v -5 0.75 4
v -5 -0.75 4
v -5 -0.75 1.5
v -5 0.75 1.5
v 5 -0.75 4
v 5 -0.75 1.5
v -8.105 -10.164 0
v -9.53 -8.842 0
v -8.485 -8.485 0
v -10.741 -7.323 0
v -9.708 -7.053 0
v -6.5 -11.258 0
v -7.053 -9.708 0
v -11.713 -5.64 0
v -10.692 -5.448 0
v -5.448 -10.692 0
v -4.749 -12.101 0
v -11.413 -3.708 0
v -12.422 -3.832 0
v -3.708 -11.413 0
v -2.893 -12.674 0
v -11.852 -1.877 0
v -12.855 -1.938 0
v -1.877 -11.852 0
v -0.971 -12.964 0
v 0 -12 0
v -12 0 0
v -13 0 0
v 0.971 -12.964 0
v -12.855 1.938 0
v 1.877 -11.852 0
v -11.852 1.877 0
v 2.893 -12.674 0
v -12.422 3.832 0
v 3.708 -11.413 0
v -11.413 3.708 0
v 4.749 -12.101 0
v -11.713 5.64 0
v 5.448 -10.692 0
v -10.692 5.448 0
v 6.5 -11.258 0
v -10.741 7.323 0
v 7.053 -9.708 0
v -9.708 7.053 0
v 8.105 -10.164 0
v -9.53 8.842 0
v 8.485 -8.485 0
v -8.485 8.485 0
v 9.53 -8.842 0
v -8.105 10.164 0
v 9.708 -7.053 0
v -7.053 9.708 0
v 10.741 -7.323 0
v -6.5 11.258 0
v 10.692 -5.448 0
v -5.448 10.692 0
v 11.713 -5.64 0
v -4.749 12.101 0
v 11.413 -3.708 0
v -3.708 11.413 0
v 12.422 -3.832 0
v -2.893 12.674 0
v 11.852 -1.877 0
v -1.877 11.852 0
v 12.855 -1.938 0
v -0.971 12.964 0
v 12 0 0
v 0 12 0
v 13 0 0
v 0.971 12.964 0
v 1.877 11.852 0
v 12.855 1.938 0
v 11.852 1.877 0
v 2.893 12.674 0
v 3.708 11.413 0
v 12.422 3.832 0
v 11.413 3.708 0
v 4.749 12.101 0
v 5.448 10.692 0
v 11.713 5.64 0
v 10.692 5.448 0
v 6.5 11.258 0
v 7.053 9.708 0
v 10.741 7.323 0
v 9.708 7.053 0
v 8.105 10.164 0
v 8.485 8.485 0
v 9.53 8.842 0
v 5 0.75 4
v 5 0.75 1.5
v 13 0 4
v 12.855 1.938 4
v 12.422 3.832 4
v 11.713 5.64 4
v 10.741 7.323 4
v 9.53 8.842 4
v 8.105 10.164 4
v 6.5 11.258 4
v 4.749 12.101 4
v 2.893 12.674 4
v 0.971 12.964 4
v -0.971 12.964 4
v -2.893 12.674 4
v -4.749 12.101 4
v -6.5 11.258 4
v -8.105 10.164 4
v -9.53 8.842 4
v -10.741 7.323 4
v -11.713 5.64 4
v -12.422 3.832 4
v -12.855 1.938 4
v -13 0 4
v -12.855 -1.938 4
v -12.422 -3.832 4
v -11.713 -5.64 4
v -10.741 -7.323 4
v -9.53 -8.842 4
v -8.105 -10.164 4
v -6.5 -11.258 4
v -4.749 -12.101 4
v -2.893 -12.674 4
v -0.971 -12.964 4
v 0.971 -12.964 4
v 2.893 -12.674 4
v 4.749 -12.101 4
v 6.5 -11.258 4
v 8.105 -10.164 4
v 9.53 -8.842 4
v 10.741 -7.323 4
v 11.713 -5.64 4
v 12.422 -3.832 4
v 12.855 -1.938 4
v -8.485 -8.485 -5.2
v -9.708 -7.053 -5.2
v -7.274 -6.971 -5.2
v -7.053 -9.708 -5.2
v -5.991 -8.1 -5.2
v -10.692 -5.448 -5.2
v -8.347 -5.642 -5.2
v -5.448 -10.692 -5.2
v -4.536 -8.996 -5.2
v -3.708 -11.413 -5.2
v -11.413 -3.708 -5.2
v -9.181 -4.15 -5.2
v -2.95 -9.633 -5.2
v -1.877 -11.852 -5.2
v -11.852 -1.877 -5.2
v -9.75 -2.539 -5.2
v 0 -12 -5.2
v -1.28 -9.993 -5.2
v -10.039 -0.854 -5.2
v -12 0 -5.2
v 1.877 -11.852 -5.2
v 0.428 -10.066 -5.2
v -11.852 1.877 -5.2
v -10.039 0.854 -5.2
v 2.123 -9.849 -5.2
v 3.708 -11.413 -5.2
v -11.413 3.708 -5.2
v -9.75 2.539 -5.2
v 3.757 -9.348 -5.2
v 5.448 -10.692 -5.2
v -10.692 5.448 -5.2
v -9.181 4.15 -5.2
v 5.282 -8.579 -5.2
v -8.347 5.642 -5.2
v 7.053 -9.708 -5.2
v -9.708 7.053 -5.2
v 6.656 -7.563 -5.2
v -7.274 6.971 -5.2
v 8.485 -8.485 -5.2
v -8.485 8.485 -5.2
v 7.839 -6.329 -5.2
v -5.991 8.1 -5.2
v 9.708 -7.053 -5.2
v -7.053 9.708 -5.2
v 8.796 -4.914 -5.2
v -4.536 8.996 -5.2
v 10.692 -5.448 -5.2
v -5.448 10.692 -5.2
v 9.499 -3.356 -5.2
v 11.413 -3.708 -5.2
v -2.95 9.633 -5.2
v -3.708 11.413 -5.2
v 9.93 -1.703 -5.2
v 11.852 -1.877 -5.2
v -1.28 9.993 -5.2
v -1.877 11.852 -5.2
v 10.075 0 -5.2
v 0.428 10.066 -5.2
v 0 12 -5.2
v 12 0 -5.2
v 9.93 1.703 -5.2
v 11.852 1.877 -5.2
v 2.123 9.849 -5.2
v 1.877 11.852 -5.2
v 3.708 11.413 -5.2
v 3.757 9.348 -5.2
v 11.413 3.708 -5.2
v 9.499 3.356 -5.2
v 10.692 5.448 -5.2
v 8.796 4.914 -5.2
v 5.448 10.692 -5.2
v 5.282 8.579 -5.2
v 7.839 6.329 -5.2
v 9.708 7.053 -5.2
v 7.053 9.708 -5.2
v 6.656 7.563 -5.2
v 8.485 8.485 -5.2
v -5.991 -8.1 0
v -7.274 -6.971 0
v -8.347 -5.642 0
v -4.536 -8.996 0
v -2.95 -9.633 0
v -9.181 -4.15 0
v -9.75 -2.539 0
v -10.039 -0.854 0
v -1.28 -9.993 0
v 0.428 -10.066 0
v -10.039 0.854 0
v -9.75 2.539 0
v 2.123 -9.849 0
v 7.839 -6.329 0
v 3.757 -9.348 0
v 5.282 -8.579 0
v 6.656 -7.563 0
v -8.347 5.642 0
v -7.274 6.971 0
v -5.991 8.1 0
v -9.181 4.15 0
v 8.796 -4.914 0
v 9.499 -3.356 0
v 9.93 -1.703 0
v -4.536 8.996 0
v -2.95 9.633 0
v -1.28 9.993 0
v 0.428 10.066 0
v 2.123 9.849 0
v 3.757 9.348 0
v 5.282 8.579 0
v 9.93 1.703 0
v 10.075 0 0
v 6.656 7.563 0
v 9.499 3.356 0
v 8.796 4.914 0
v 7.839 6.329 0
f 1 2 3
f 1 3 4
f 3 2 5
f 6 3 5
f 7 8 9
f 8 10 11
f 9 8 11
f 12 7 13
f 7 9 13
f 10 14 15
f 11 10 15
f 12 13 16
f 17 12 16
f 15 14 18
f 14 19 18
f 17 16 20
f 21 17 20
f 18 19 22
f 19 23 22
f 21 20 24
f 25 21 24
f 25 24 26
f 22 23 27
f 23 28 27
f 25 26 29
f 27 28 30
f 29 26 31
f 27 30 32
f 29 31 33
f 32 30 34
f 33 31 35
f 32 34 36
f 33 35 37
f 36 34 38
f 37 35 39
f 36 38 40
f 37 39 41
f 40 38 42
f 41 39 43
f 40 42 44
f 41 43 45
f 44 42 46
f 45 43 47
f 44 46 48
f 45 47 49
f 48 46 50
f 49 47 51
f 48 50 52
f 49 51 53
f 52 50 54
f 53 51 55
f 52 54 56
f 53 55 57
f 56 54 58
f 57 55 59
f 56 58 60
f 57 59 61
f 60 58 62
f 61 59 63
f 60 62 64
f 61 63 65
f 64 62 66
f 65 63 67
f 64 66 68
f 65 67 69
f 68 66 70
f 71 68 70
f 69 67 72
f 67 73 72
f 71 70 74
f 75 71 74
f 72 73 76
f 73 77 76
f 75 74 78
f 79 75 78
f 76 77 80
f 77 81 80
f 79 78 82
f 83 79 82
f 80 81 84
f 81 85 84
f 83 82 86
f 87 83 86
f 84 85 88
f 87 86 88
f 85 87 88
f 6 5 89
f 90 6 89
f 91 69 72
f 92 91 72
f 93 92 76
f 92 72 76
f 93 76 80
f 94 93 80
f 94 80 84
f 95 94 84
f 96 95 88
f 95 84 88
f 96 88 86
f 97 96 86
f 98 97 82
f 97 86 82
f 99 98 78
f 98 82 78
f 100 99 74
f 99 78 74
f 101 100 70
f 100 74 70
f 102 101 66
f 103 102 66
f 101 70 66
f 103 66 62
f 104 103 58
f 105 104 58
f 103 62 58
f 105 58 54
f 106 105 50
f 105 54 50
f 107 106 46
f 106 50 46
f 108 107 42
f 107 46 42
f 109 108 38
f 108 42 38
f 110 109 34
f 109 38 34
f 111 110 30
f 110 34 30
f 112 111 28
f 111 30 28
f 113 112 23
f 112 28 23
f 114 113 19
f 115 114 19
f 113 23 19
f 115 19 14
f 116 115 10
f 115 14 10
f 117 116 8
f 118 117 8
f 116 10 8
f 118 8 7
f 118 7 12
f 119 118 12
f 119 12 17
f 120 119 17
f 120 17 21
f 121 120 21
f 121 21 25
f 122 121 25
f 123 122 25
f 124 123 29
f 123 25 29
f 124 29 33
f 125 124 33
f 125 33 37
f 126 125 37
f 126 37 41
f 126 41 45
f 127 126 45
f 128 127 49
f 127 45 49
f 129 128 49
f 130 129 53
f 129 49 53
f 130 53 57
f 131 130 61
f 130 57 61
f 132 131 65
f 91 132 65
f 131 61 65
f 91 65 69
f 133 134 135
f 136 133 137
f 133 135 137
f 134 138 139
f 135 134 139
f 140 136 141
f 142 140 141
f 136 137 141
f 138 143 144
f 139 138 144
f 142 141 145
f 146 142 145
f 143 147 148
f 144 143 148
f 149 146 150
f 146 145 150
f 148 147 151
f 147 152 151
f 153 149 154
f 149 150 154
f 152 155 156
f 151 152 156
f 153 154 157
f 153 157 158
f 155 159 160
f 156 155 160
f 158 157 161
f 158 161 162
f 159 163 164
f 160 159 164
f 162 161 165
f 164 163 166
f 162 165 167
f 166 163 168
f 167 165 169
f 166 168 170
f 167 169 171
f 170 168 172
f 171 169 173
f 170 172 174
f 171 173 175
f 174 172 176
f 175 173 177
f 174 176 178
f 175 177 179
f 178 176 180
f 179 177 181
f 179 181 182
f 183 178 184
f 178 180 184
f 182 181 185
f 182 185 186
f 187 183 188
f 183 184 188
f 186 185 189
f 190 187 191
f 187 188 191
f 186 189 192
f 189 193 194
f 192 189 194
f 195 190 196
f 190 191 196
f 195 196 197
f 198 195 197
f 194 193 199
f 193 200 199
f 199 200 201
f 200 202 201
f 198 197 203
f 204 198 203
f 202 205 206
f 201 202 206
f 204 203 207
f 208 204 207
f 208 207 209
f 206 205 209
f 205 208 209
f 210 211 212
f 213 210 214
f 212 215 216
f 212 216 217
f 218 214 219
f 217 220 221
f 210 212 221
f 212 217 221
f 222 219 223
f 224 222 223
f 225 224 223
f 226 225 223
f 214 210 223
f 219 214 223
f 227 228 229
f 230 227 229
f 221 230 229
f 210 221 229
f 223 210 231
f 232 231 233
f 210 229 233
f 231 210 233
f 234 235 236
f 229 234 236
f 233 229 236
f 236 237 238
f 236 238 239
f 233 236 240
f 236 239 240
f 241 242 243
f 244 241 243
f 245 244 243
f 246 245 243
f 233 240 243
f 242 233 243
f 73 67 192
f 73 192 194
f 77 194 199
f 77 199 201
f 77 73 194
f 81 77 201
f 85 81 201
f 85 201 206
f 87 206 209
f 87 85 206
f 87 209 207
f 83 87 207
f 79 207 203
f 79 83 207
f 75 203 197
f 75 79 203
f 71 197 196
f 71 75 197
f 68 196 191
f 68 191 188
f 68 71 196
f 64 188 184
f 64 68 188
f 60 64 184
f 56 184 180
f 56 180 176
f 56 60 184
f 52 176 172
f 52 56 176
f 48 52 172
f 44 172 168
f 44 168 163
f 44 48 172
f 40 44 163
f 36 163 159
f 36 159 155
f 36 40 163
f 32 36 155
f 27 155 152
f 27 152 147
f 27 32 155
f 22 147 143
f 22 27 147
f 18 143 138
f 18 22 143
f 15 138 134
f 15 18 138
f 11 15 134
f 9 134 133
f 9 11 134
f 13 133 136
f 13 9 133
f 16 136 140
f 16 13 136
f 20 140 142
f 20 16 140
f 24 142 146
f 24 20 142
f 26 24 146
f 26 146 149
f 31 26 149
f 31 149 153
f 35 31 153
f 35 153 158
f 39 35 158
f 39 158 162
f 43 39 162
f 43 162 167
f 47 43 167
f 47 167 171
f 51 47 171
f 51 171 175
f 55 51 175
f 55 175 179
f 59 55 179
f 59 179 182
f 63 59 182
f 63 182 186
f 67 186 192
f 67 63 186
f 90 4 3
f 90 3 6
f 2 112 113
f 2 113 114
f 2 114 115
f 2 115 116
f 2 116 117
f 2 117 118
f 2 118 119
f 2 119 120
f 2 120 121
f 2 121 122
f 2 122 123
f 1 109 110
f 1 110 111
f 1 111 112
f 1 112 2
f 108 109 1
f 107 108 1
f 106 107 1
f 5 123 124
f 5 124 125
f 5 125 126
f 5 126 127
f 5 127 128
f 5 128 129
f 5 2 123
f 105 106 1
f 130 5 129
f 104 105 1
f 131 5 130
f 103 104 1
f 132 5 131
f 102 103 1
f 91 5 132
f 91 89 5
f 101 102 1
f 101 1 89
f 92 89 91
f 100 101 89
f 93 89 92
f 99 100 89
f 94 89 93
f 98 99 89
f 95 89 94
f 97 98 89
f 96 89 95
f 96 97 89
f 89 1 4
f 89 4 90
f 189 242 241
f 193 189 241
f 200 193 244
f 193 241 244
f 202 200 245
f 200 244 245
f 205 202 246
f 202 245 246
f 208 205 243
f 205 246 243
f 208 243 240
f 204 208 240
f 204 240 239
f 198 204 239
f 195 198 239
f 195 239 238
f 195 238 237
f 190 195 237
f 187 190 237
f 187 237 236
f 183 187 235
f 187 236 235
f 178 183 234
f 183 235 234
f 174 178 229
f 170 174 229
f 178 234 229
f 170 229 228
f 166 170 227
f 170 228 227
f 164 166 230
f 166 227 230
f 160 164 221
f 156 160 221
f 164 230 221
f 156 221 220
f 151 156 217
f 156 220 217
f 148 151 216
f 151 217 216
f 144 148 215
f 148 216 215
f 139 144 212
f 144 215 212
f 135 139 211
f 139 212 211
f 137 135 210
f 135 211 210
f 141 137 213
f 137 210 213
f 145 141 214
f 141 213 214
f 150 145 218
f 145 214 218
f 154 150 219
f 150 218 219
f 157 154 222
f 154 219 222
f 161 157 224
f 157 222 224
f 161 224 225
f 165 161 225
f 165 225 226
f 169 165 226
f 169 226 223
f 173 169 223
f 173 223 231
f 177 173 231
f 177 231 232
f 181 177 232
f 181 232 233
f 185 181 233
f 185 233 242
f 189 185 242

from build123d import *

# Parameters (mm, degrees)
SKETCH_1_R          = 13
EXTRUDE_1_DEPTH     = 4
SKETCH_2_R          = 12
SKETCH_2_R_2        = 10.075
EXTRUDE_2_DEPTH     = 5.2
SKETCH_3_W          = 10
SKETCH_3_H          = 1.5
CUT_EXTRUDE_1_DEPTH = 2.5


with BuildPart() as part:
    # 스케치1 → 보스-돌출1 (new body)
    with BuildSketch(Plane.XY):
        Circle(SKETCH_1_R)
    extrude(amount=EXTRUDE_1_DEPTH)

    # 스케치2 → 보스-돌출2 (add)
    with BuildSketch(Plane.XY):
        Circle(SKETCH_2_R)
        Circle(SKETCH_2_R_2, mode=Mode.SUBTRACT)
    extrude(amount=-EXTRUDE_2_DEPTH)

    # 스케치3 → 컷-돌출1 (cut)
    with BuildSketch(Plane.XY.offset(4)):
        Rectangle(SKETCH_3_W, SKETCH_3_H)
    extrude(amount=-CUT_EXTRUDE_1_DEPTH, mode=Mode.SUBTRACT)


solid = part.part
